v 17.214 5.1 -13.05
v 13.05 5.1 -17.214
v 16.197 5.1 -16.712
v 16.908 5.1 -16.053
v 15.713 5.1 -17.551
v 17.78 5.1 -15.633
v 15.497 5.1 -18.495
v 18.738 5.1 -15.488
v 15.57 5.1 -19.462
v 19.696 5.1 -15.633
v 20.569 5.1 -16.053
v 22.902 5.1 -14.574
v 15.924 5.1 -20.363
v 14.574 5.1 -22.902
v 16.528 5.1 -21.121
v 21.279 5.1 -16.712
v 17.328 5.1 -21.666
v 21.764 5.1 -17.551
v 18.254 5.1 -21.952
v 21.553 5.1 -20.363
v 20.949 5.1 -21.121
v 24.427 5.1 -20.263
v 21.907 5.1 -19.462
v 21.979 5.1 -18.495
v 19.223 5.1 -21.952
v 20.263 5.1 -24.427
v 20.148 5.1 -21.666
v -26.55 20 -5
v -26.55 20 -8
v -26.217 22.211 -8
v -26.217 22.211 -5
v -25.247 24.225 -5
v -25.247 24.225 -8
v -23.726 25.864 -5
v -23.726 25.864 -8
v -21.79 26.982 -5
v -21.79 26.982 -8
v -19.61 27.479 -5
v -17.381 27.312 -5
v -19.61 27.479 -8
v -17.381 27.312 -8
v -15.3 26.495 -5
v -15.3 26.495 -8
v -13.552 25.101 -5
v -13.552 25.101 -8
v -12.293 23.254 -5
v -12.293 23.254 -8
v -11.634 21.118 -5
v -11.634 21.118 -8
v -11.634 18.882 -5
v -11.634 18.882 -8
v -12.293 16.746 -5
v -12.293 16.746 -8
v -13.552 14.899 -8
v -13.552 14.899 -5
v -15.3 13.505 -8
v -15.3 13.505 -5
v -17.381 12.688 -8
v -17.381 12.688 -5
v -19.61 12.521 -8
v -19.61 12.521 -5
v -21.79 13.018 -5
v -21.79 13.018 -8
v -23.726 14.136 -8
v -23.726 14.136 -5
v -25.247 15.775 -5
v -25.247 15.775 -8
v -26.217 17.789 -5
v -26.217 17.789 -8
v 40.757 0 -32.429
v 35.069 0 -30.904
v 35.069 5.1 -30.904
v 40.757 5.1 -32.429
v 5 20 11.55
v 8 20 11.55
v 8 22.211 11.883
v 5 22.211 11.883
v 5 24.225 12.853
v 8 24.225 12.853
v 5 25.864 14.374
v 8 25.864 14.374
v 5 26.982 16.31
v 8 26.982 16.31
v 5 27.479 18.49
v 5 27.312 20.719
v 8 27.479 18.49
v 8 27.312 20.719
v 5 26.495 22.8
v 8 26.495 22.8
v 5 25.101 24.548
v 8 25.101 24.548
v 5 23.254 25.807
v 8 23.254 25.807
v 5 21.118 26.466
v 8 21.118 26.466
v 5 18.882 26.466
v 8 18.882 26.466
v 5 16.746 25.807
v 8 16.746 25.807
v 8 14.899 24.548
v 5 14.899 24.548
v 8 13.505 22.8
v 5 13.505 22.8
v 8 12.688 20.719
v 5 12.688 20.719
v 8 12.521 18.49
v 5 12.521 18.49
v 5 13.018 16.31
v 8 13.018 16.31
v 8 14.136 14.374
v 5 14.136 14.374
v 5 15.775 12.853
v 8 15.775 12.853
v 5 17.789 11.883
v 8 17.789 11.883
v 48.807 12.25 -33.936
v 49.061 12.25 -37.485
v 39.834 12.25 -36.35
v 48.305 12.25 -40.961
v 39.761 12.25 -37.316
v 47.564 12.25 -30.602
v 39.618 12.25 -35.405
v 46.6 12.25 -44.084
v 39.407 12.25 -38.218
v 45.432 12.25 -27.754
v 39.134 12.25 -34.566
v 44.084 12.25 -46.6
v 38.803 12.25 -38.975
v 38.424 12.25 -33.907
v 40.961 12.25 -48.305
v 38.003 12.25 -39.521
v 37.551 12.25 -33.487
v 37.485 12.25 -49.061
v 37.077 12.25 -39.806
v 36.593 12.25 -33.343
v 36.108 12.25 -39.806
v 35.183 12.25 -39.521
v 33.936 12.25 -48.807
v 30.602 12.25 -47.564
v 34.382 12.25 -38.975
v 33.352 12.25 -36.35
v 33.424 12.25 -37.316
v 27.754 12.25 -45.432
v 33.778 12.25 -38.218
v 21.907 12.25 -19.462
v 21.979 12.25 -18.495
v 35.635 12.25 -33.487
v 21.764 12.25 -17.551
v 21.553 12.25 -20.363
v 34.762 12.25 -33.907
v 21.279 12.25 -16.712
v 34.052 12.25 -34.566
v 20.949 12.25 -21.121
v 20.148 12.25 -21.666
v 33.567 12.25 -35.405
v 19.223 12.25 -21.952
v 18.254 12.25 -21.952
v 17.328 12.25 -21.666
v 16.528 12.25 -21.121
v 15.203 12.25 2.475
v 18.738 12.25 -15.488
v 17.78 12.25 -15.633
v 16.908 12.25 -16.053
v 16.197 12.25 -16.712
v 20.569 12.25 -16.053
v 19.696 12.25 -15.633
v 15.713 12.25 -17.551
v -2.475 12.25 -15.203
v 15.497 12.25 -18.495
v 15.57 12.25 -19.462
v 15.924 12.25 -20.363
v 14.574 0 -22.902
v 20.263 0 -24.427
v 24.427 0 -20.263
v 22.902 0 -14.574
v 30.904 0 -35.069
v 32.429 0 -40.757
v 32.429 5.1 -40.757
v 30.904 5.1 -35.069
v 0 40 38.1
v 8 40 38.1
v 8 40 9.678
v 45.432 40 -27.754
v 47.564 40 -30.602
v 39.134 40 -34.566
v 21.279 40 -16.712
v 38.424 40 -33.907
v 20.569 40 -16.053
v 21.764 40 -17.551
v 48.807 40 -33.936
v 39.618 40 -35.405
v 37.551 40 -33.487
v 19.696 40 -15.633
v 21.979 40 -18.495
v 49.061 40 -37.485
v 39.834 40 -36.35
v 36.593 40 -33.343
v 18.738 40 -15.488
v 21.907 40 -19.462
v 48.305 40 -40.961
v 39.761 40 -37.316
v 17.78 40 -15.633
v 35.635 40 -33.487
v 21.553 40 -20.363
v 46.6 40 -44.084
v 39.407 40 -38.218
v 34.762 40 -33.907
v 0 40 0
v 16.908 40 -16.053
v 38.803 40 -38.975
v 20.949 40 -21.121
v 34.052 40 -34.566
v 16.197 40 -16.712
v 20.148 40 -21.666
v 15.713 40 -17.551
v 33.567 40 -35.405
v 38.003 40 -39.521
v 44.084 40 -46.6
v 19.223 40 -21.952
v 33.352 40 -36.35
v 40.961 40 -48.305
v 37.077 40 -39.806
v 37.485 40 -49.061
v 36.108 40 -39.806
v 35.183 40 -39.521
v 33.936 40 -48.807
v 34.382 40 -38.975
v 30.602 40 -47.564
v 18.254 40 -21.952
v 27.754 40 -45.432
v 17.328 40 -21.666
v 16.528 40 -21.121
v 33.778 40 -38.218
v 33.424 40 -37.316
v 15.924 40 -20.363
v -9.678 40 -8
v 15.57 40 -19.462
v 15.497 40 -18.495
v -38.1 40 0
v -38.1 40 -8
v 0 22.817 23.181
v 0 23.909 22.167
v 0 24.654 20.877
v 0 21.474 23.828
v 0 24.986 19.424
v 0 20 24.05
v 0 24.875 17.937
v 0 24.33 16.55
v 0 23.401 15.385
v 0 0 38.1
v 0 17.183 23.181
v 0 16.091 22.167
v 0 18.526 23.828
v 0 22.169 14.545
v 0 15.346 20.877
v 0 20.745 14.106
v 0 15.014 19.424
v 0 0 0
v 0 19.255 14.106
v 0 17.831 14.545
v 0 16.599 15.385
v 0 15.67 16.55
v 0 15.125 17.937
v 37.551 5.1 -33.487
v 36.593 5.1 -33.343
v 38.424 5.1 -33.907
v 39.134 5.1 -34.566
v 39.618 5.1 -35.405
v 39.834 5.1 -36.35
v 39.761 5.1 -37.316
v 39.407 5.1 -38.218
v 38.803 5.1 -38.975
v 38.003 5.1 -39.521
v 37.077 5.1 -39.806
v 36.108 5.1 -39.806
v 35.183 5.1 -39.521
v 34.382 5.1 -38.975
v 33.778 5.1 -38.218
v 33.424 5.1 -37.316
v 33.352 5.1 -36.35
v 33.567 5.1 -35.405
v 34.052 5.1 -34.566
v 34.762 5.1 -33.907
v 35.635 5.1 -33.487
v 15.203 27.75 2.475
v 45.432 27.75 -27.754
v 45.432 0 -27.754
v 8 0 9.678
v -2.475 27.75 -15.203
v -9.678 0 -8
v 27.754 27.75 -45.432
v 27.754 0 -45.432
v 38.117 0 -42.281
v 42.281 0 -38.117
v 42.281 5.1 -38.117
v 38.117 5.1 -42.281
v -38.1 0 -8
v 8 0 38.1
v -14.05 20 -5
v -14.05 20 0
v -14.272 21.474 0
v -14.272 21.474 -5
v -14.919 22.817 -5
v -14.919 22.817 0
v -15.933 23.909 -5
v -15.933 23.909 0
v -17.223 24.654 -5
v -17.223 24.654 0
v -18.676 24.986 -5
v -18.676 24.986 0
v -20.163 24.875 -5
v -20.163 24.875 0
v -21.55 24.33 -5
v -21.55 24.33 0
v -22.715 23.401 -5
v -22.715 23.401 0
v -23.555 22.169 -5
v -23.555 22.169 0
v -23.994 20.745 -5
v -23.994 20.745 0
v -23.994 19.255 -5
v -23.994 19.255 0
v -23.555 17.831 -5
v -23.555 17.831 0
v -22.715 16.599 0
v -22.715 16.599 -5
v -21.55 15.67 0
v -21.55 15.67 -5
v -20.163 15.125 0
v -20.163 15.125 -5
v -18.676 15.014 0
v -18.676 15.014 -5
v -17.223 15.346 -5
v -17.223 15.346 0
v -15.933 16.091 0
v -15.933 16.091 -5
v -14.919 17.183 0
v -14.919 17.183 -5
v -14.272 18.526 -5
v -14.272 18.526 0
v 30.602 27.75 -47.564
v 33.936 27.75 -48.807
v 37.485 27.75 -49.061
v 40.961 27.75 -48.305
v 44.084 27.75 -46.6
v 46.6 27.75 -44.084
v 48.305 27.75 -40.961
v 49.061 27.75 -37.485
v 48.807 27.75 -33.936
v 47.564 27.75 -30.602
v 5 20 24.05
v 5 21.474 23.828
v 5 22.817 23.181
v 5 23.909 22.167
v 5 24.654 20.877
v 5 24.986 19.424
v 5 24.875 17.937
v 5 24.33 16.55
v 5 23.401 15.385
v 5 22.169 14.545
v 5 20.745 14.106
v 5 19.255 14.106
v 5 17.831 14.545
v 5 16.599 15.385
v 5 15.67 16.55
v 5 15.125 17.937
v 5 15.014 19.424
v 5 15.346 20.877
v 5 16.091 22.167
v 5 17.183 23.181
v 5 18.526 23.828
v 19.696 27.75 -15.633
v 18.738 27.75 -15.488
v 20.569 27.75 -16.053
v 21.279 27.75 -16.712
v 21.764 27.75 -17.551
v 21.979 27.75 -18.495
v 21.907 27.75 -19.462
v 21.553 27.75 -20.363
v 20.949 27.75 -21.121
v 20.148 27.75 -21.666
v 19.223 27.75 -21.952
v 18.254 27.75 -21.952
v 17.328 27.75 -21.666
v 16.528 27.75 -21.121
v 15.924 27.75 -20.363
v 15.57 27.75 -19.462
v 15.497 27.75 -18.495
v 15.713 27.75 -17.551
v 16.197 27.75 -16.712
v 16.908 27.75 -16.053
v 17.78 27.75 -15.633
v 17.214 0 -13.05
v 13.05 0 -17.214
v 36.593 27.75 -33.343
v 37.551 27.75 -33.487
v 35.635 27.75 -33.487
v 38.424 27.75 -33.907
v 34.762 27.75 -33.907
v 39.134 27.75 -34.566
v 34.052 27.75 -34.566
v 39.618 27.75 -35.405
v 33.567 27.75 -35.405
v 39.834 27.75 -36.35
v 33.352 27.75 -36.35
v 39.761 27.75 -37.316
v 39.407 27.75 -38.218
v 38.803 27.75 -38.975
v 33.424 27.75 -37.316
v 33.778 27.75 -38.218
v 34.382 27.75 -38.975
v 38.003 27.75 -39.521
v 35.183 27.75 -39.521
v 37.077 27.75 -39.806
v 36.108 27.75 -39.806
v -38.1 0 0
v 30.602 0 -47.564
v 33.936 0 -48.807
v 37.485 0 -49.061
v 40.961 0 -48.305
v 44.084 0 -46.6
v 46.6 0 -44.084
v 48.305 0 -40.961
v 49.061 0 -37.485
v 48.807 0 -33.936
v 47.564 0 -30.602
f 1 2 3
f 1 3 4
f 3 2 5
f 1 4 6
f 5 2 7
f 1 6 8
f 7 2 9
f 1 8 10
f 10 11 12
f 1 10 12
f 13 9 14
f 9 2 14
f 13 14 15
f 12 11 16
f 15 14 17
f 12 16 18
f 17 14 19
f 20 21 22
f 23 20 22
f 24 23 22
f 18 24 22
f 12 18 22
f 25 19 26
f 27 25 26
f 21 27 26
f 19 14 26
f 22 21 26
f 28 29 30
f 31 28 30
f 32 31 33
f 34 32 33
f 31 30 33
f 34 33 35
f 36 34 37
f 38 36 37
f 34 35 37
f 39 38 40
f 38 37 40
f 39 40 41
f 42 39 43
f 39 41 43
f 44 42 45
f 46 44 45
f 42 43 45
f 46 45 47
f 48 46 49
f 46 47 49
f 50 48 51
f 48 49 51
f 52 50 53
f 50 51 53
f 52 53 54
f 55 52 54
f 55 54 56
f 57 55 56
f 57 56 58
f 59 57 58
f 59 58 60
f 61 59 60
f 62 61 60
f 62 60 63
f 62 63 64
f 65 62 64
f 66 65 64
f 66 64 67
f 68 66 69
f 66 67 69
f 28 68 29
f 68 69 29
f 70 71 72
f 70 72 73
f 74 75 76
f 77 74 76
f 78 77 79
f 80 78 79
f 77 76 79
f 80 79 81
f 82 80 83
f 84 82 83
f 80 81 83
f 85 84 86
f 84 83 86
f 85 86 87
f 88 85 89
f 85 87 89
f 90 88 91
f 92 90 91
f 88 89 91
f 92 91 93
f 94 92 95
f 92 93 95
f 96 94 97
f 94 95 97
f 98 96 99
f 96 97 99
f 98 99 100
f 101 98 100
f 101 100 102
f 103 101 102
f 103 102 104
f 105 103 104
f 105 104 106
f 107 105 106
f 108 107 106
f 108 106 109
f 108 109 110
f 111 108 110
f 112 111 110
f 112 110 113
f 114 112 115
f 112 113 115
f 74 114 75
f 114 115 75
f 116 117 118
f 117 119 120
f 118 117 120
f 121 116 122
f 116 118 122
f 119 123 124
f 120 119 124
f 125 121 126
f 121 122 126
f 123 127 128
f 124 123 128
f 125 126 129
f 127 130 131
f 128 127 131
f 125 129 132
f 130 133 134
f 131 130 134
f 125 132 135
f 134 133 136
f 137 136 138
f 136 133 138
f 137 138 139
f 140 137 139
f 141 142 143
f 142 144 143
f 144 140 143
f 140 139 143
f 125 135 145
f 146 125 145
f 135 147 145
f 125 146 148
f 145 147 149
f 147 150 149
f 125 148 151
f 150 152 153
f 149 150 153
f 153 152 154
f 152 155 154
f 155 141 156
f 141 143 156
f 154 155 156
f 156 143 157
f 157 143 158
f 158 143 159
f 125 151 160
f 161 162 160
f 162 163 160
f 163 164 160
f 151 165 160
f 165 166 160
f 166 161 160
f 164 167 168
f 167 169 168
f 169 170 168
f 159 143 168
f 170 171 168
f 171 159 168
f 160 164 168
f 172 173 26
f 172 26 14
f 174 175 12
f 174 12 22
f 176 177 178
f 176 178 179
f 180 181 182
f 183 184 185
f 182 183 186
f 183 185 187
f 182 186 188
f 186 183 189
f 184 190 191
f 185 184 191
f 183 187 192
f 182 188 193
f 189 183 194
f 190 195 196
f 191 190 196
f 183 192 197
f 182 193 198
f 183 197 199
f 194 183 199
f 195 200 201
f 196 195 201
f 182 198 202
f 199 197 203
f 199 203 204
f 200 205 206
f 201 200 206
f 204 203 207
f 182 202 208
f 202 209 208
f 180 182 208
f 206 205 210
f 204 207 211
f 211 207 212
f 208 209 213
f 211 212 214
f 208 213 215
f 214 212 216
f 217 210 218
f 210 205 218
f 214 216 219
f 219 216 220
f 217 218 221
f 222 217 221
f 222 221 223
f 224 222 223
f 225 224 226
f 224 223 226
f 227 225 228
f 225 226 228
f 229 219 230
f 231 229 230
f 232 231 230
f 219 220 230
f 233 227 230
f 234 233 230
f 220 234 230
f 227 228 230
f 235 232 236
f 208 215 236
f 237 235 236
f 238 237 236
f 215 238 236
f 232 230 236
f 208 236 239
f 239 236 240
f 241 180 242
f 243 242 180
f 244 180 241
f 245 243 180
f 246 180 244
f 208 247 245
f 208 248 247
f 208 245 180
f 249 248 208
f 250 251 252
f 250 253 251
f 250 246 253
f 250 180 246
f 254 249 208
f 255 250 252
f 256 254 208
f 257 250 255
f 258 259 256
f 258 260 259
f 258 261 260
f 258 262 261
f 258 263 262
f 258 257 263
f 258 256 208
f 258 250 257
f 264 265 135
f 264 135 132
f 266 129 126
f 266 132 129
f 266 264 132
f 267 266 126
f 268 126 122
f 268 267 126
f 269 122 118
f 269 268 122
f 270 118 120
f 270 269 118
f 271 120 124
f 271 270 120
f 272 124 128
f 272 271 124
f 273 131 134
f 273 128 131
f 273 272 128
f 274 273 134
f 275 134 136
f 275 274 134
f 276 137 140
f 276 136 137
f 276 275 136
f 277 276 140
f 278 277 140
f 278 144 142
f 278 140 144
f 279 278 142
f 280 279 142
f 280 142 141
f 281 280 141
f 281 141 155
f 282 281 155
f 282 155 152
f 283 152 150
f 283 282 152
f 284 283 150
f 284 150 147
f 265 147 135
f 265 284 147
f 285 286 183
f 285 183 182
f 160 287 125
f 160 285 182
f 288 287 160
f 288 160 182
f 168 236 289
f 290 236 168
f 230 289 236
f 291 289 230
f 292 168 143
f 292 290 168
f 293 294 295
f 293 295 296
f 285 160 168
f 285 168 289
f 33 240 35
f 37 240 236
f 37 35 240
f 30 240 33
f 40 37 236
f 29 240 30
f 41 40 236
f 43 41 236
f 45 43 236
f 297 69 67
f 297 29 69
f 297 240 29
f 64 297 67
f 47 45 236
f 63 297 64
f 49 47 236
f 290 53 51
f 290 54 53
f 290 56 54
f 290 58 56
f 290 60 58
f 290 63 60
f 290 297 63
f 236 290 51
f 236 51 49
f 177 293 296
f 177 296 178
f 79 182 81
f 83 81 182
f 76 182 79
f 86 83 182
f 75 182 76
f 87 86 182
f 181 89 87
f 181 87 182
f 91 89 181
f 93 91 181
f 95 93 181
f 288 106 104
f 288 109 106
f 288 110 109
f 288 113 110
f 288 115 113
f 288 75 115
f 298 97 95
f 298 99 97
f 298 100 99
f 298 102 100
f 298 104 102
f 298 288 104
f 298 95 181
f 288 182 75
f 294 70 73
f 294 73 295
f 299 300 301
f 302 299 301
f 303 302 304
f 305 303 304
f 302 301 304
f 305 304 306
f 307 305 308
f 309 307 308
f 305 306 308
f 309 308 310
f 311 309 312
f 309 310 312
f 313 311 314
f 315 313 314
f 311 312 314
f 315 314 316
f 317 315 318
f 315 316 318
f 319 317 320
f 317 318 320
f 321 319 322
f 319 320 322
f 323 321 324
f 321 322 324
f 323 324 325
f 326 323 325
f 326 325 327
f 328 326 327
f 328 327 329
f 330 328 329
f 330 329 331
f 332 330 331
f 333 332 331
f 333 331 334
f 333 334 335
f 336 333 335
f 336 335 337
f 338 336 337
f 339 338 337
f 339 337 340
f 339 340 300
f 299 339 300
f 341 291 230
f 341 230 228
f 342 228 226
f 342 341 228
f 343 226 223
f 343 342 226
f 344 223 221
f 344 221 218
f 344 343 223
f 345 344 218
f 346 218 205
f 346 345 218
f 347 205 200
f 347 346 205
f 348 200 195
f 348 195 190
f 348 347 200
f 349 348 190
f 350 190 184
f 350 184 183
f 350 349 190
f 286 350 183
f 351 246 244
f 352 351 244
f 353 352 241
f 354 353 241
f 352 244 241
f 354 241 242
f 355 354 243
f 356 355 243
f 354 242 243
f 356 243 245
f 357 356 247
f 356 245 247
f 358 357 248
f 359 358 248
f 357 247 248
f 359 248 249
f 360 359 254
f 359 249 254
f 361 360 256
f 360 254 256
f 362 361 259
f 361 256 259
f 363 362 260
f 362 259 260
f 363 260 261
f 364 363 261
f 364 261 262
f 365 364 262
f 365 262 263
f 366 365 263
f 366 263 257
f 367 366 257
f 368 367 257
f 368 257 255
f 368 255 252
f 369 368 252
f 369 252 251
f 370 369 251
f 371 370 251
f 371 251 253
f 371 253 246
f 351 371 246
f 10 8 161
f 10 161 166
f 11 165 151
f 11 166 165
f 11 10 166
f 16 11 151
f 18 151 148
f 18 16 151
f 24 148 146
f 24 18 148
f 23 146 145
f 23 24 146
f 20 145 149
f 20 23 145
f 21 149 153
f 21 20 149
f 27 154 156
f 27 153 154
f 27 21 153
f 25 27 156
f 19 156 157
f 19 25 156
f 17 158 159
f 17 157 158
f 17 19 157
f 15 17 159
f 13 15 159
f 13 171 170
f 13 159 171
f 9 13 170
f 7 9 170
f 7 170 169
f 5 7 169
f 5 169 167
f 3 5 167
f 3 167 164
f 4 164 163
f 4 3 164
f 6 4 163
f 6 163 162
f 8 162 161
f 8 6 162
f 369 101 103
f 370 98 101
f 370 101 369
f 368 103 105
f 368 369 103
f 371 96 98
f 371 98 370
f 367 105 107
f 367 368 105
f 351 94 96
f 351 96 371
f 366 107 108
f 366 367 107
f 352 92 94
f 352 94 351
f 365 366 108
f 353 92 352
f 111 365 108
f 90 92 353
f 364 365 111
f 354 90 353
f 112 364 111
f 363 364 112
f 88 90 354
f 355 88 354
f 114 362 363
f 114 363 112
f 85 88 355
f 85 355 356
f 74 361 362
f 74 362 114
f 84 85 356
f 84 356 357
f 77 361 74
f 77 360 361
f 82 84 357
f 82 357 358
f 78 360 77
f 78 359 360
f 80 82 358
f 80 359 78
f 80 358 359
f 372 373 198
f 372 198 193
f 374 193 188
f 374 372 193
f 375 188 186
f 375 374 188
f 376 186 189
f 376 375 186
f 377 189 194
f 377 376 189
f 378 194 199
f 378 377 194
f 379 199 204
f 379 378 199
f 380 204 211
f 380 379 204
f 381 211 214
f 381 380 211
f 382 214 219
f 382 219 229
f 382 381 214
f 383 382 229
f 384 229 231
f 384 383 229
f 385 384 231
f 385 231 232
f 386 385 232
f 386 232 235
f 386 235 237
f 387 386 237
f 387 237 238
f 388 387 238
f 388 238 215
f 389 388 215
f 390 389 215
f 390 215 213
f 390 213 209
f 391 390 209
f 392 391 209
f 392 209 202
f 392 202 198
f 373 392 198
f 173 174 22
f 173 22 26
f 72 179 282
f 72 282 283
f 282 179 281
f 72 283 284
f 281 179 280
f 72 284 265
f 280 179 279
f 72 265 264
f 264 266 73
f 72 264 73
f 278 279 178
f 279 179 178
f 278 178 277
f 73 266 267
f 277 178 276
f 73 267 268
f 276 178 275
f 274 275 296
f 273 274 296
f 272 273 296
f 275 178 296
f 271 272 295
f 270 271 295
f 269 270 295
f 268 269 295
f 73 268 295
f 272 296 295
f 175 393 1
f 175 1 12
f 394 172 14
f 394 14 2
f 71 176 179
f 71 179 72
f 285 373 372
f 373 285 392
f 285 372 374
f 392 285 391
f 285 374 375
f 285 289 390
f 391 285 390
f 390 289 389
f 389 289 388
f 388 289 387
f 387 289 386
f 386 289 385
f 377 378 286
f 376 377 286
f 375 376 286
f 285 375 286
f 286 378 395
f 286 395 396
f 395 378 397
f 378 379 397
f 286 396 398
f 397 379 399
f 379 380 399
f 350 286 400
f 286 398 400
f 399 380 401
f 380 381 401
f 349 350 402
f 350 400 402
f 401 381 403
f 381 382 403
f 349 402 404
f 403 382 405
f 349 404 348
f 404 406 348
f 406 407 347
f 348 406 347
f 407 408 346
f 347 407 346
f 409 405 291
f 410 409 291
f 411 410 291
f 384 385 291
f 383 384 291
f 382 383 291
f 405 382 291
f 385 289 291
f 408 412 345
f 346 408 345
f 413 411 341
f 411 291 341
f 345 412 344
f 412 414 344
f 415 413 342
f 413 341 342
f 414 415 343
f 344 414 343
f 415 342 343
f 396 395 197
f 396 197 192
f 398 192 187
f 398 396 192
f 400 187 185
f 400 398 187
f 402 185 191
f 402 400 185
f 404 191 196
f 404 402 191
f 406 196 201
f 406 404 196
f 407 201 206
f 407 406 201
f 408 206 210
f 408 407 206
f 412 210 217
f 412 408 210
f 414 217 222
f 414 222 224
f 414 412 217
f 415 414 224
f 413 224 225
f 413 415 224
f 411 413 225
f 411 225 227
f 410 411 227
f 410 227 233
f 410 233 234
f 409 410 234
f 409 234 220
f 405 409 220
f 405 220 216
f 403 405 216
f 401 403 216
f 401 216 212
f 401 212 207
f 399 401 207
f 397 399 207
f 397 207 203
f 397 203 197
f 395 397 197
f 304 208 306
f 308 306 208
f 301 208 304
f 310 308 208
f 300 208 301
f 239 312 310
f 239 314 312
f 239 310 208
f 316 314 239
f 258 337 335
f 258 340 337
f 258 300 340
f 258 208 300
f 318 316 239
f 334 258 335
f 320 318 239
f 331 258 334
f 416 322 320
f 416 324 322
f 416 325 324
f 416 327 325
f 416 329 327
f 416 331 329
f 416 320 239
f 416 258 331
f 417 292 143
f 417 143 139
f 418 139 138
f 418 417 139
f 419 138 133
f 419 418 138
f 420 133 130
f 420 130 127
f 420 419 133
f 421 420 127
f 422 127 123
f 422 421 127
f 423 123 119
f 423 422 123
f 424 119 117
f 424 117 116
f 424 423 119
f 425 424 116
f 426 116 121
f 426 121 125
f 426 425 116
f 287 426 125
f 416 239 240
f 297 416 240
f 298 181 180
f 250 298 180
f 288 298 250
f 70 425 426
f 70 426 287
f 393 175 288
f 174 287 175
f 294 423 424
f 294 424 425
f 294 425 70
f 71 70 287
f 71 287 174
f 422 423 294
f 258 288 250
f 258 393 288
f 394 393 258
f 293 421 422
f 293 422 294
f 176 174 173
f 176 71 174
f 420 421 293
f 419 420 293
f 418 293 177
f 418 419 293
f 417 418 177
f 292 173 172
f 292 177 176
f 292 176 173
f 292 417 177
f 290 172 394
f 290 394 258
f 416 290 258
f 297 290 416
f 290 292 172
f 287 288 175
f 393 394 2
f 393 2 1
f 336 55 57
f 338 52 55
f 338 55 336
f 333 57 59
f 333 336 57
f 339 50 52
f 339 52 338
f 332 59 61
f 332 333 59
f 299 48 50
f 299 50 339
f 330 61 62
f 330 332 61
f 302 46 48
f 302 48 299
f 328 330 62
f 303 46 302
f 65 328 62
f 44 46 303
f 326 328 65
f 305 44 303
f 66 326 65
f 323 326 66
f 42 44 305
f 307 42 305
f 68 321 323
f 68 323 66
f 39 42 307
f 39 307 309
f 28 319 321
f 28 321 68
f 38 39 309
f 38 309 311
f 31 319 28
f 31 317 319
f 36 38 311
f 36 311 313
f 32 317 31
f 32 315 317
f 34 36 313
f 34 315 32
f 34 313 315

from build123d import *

# Parameters (mm, degrees)
SKETCH2_R               = 3.25
BOSS_EXTRUDE1_DEPTH     = 40
CUT_EXTRUDE1_DEPTH      = 81.126158627
CUT_EXTRUDE1_DEPTH_BACK = 81.126158627
SKETCH4_R               = 5
CUT_EXTRUDE2_DEPTH      = 50
SKETCH6_R               = 5
CUT_EXTRUDE4_DEPTH      = 50
SKETCH7_R               = 7.5
CUT_EXTRUDE5_DEPTH      = 3
CUT_EXTRUDE6_DEPTH      = 5.1
SKETCH5_R               = 7.5
CUT_EXTRUDE7_DEPTH      = 3


with BuildPart() as part:
    # Sketch2 → Boss-Extrude1 (new body)
    with BuildSketch(Plane(origin=(0, 0, 0), x_dir=(1, 0, 0), z_dir=(0, 1, 0))):
        with BuildLine():
            Line((-38.1, 0), (-38.1, 8))
            Line((-38.1, 8), (-9.67766953, 8))
            Line((-9.67766953, 8), (27.753941162, 45.431610691))
            ThreePointArc((27.753941162, 45.431610691), (45.431610691, 45.431610691), (45.431610691, 27.753941162))
            Line((45.431610691, 27.753941162), (8, -9.67766953))
            Line((8, -9.67766953), (8, -38.1))
            Line((8, -38.1), (0, -38.1))
            Line((0, -38.1), (0, 0))
            Line((0, 0), (-38.1, 0))
        make_face()
        with Locations(Location((18.738329701, 18.738329701, 0), (0, 0, 270))):
            Circle(SKETCH2_R, mode=Mode.SUBTRACT)
        with Locations(Location((36.592775926, 36.592775926, 0), (0, 0, 270))):
            Circle(SKETCH2_R, mode=Mode.SUBTRACT)
    extrude(amount=BOSS_EXTRUDE1_DEPTH)

    # Sketch3 → Cut-Extrude1 (cut, two sides: drawn at the far end of the back side and taken through both)
    with BuildSketch(Plane(origin=(0, 0, 0), x_dir=(0, -1, 0), z_dir=(0.7071067811865488, 0, 0.7071067811865464)).offset(-CUT_EXTRUDE1_DEPTH_BACK)):
        Polygon((-12.25, 9), (-27.75, 9), (-27.75, 69), (-35, 69), (-35, 89), (-5, 89), (-5, 69), (-12.25, 69), align=None)
    extrude(amount=CUT_EXTRUDE1_DEPTH + CUT_EXTRUDE1_DEPTH_BACK, mode=Mode.SUBTRACT)

    # Sketch4 → Cut-Extrude2 (cut)
    with BuildSketch(Plane.XY):
        with Locations((-19.05, 20)):
            Circle(SKETCH4_R)
    extrude(amount=-CUT_EXTRUDE2_DEPTH, mode=Mode.SUBTRACT)

    # Sketch6 → Cut-Extrude4 (cut)
    with BuildSketch(Plane.ZY):
        with Locations((19.05, 20)):
            Circle(SKETCH6_R)
    extrude(amount=-CUT_EXTRUDE4_DEPTH, mode=Mode.SUBTRACT)

    # Sketch7 → Cut-Extrude5 (cut)
    with BuildSketch(Plane(origin=(8, 0, 0), x_dir=(0, 0, -1), z_dir=(1, 0, 0))):
        with Locations((-19.05, 20)):
            Circle(SKETCH7_R)
    extrude(amount=-CUT_EXTRUDE5_DEPTH, mode=Mode.SUBTRACT)

    # Sketch10 → Cut-Extrude6 (cut)
    with BuildSketch(Plane(origin=(0, 0, 0), x_dir=(1, 0, 0), z_dir=(0, 1, 0))):
        Polygon((14.574197139, 22.902462264), (13.050018836, 17.214151399), (17.214151399, 13.050018836), (22.902462264, 14.574197139), (24.426640567, 20.262508004), (20.262508004, 24.426640567), align=None)
        Polygon((35.068597624, 30.904465061), (40.756908489, 32.428643364), (42.281086792, 38.116954229), (38.116954229, 42.281086792), (32.428643364, 40.756908489), (30.904465061, 35.068597624), align=None)
    extrude(amount=CUT_EXTRUDE6_DEPTH, mode=Mode.SUBTRACT)

    # Sketch5 → Cut-Extrude7 (cut)
    with BuildSketch(Plane(origin=(0, 0, -8), x_dir=(-1, 0, 0), z_dir=(0, 0, -1))):
        with Locations((19.05, 20)):
            Circle(SKETCH5_R)
    extrude(amount=-CUT_EXTRUDE7_DEPTH, mode=Mode.SUBTRACT)


solid = part.part
